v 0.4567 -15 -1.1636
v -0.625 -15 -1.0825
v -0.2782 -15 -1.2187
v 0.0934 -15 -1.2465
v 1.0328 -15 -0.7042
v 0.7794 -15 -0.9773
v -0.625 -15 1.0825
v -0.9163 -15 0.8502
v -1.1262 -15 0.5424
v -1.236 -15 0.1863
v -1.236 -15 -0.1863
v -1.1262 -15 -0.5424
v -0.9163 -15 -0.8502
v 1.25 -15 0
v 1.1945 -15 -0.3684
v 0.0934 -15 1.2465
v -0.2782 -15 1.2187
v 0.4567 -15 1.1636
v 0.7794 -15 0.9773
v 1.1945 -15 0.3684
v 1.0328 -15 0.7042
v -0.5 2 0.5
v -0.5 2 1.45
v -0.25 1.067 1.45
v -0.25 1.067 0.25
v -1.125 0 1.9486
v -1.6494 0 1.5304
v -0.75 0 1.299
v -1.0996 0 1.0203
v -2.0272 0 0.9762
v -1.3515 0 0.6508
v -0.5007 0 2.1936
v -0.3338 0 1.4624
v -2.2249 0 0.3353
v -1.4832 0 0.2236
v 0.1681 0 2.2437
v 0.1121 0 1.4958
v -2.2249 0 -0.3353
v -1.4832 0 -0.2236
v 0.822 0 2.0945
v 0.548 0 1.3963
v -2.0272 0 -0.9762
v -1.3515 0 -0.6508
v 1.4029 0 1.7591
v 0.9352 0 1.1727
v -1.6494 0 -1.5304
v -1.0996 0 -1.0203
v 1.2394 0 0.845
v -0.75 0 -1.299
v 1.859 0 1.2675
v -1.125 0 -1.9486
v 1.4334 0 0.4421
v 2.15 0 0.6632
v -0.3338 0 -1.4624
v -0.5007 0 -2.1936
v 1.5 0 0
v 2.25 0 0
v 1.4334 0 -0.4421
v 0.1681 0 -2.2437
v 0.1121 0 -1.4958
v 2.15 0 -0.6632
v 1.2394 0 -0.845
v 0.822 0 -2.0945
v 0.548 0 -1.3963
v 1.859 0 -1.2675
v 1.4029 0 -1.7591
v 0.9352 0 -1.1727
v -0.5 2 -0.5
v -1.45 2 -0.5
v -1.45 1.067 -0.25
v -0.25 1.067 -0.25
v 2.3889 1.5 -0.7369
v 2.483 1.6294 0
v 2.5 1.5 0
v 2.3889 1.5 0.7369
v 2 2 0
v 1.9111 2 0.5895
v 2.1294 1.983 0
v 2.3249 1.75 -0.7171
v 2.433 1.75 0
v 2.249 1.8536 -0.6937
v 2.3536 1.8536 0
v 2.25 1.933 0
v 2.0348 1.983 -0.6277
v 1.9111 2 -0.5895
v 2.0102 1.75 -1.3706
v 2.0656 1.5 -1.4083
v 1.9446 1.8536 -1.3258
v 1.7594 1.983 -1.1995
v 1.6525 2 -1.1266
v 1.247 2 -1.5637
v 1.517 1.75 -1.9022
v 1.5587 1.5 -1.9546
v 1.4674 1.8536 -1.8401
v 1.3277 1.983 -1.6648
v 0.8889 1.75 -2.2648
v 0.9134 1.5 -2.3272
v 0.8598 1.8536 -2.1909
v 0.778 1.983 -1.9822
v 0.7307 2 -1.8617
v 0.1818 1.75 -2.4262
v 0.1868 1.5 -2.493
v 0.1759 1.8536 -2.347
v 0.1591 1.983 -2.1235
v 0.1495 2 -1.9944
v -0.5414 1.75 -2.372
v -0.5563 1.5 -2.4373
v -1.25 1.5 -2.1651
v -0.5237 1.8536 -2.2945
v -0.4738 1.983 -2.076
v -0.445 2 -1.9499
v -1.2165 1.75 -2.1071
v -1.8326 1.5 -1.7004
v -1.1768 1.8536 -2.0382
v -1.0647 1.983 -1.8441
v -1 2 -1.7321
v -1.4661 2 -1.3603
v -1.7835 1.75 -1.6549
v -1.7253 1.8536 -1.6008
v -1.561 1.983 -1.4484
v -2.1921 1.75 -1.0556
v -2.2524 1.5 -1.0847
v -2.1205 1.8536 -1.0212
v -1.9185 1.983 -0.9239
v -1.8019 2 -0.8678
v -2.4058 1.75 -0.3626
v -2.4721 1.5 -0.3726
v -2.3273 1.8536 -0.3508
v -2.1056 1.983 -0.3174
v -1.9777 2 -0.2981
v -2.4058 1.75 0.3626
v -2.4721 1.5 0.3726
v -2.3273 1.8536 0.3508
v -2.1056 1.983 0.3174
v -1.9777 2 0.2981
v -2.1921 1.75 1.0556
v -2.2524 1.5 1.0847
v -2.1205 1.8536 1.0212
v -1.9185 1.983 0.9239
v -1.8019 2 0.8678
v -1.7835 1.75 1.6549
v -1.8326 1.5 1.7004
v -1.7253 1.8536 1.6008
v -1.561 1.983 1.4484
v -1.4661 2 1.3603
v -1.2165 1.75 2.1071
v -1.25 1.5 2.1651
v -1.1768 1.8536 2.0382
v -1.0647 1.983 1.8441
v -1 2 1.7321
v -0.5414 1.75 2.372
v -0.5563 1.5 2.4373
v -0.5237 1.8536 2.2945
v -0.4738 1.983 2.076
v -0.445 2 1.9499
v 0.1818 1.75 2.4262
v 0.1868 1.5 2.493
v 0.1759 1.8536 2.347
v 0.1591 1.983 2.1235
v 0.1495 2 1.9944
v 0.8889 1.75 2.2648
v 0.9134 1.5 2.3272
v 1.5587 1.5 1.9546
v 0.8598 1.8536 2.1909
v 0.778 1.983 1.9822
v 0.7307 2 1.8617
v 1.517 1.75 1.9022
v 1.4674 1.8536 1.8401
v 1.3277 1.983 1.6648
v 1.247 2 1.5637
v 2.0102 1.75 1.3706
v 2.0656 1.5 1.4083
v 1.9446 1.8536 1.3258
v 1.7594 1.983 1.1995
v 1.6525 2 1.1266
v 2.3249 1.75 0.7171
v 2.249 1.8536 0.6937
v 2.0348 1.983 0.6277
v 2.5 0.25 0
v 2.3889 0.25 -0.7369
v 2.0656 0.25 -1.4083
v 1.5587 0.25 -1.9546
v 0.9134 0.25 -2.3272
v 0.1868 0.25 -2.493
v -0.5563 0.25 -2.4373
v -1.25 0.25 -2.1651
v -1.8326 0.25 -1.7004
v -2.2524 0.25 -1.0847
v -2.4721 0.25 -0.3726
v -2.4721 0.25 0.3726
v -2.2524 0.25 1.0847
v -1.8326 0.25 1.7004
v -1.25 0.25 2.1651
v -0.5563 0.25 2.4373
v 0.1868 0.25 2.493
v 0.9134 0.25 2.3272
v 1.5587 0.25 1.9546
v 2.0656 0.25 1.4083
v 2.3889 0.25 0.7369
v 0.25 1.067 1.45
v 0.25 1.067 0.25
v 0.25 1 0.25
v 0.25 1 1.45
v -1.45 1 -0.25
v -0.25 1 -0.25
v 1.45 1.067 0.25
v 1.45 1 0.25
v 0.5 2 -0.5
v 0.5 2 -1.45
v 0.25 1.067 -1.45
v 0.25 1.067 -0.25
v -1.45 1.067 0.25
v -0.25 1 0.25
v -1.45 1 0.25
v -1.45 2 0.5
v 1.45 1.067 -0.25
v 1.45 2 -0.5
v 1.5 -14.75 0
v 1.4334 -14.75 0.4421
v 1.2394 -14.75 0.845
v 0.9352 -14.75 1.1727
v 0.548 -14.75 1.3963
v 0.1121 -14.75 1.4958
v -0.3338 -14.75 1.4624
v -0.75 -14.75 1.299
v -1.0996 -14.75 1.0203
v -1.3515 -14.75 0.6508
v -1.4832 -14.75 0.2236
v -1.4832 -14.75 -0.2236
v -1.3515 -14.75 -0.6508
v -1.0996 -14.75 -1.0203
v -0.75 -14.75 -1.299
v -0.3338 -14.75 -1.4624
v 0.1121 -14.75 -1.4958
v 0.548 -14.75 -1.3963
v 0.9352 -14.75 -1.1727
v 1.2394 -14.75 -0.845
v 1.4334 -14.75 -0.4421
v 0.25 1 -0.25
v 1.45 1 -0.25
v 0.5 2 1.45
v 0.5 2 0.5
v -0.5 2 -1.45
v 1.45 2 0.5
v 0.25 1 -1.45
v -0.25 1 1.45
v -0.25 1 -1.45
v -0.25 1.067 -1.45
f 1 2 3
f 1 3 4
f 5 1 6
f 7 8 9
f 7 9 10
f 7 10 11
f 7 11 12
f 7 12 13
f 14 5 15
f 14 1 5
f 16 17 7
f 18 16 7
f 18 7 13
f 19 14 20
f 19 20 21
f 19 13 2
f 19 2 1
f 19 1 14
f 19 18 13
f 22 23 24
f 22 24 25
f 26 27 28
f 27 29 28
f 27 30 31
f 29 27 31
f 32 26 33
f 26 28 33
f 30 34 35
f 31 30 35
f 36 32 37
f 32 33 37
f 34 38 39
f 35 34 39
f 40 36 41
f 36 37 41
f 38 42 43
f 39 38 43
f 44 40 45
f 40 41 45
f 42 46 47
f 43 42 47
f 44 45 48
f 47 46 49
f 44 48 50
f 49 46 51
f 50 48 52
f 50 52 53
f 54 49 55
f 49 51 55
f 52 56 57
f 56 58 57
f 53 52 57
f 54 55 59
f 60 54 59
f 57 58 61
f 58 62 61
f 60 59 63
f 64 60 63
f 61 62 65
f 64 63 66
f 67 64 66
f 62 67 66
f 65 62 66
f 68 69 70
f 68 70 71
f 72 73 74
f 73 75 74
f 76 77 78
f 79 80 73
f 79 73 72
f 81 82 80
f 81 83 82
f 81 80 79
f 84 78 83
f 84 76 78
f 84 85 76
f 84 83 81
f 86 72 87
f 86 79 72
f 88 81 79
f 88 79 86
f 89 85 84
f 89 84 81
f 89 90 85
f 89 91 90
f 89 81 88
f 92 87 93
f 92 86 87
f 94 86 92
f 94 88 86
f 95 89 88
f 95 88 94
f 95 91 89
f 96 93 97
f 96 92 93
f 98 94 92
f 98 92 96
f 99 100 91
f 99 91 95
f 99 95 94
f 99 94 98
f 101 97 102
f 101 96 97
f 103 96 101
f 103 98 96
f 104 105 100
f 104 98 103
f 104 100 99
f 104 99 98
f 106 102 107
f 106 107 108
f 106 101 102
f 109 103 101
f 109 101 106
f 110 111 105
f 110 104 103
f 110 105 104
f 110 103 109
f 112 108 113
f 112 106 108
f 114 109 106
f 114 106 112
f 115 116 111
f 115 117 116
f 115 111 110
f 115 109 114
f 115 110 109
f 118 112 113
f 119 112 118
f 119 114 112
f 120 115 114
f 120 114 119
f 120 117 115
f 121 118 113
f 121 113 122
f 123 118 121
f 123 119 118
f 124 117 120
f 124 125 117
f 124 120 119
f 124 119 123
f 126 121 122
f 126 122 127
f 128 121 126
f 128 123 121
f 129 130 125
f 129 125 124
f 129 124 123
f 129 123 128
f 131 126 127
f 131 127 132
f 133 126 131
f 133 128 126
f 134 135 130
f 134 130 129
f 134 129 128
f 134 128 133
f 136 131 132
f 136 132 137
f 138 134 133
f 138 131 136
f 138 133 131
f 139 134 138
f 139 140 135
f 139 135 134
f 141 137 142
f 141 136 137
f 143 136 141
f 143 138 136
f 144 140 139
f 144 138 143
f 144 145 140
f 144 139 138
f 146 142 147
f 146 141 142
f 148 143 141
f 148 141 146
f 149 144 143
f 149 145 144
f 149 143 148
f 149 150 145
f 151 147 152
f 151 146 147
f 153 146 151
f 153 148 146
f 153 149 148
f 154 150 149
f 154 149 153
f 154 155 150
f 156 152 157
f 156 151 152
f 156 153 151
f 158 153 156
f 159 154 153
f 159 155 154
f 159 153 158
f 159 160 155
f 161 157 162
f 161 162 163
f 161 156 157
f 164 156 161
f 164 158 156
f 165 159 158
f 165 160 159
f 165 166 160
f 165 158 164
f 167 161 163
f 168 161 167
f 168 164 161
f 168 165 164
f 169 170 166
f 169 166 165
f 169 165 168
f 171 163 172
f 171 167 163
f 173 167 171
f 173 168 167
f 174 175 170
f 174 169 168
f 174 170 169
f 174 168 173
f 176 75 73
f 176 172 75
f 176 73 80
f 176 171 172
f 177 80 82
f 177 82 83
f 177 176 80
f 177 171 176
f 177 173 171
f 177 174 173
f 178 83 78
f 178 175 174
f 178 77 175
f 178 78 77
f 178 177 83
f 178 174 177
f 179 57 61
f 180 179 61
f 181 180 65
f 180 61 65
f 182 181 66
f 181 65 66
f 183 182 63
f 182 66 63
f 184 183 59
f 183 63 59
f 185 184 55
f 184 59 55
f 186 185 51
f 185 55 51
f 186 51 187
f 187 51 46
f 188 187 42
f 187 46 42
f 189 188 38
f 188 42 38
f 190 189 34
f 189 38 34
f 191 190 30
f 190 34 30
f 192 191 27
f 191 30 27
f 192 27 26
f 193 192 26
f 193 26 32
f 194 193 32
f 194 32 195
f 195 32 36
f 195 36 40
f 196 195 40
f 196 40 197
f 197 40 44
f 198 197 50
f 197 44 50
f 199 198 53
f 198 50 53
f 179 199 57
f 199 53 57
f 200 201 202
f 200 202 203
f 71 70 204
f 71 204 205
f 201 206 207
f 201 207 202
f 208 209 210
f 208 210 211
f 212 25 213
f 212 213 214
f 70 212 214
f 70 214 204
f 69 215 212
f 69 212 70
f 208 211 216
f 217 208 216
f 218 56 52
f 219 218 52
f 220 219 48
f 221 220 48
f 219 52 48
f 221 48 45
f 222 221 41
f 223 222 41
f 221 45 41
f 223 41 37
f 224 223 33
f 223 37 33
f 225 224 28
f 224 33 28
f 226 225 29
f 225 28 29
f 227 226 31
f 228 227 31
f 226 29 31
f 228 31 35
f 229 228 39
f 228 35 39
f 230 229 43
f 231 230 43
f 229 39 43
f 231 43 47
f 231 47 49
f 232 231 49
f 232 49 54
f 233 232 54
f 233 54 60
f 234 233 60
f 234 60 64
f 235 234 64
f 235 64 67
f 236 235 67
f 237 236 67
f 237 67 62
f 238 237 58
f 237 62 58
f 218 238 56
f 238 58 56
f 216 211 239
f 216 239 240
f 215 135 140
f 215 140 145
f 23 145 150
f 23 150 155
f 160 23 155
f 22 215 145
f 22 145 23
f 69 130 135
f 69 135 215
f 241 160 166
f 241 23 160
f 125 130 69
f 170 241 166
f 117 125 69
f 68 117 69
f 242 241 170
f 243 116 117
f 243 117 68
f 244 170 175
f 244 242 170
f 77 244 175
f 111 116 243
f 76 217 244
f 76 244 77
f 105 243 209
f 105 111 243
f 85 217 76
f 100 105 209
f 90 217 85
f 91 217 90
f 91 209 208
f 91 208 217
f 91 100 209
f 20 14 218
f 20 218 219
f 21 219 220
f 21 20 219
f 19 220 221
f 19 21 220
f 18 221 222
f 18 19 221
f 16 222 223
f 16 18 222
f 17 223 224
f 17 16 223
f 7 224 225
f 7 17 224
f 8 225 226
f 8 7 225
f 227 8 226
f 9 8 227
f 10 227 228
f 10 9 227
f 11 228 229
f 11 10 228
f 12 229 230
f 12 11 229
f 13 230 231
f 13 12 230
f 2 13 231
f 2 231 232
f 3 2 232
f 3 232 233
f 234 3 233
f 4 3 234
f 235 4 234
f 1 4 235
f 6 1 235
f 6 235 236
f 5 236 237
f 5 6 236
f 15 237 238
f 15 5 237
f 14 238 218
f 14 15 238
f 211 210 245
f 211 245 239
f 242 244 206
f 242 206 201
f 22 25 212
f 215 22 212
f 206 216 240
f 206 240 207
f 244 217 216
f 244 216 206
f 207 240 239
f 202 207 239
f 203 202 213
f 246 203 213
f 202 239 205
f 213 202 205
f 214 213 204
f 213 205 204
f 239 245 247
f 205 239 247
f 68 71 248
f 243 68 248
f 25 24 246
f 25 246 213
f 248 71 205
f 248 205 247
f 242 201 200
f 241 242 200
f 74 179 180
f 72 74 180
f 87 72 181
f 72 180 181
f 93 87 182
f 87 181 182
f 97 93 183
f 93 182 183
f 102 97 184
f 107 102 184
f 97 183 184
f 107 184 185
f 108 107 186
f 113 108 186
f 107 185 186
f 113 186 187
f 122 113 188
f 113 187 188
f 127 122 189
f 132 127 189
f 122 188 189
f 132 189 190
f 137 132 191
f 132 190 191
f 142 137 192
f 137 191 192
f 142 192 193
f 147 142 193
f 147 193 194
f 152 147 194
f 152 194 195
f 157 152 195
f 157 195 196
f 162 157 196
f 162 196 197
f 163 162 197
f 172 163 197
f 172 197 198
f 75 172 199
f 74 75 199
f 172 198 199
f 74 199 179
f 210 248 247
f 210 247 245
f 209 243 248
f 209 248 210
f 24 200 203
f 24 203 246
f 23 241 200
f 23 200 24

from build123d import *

# Parameters (mm, degrees)
CROQUIS1_R              = 2.5
SALIENTE_EXTRUIR1_DEPTH = 2
CROQUIS2_R              = 1.5
SALIENTE_EXTRUIR2_DEPTH = 15
CHAFL_N1_SIZE           = 0.25
REDONDEO1_R             = 0.5
CORTAR_EXTRUIR1_DEPTH   = 1
CHAFL_N2_SIZE           = 0.25
CHAFL_N2_SIZE2          = 0.933012702


with BuildPart() as part:
    # Croquis1 → Saliente-Extruir1 (new body)
    with BuildSketch(Plane(origin=(0, 0, 0), x_dir=(1, 0, 0), z_dir=(0, 1, 0))):
        Circle(CROQUIS1_R)
    extrude(amount=SALIENTE_EXTRUIR1_DEPTH)

    # Croquis2 → Saliente-Extruir2 (add)
    with BuildSketch(Plane.XZ):
        Circle(CROQUIS2_R)
    extrude(amount=SALIENTE_EXTRUIR2_DEPTH)

    # Chaflán1
    chafl_n1_edges = [part.edges().sort_by_distance(p)[0] for p in [
        (-2.5, 0, 0),
        (-1.5, -15, 0),
    ]]
    chamfer(chafl_n1_edges, length=CHAFL_N1_SIZE)

    # Redondeo1
    redondeo1_edges = [part.edges().sort_by_distance(p)[0] for p in [
        (-2.5, 2, 0),
    ]]
    fillet(redondeo1_edges, radius=REDONDEO1_R)

    # Croquis3 → Cortar-Extruir1 (cut)
    with BuildSketch(Plane(origin=(0, 2, 0), x_dir=(1, 0, 0), z_dir=(0, 1, 0))):
        Polygon((0.25, 0.25), (1.45, 0.25), (1.45, -0.25), (0.25, -0.25), (0.25, -1.45), (-0.25, -1.45), (-0.25, -0.25), (-1.45, -0.25), (-1.45, 0.25), (-0.25, 0.25), (-0.25, 1.45), (0.25, 1.45), align=None)
    extrude(amount=-CORTAR_EXTRUIR1_DEPTH, mode=Mode.SUBTRACT)

    # Chaflán2
    chafl_n2_edges = [part.edges().sort_by_distance(p)[0] for p in [
        (-0.25, 2, -0.85),
        (-0.85, 2, -0.25),
        (-0.85, 2, 0.25),
        (-0.25, 2, 0.85),
        (0.25, 2, 0.85),
        (0.85, 2, 0.25),
        (0.85, 2, -0.25),
        (0.25, 2, -0.85),
    ]]
    chafl_n2_side = [part.faces().sort_by_distance(p)[0] for p in [
        (-1.943431458, 2, 0),
    ]]
    chamfer(chafl_n2_edges, length=CHAFL_N2_SIZE, length2=CHAFL_N2_SIZE2, reference=chafl_n2_side[0])


solid = part.part
